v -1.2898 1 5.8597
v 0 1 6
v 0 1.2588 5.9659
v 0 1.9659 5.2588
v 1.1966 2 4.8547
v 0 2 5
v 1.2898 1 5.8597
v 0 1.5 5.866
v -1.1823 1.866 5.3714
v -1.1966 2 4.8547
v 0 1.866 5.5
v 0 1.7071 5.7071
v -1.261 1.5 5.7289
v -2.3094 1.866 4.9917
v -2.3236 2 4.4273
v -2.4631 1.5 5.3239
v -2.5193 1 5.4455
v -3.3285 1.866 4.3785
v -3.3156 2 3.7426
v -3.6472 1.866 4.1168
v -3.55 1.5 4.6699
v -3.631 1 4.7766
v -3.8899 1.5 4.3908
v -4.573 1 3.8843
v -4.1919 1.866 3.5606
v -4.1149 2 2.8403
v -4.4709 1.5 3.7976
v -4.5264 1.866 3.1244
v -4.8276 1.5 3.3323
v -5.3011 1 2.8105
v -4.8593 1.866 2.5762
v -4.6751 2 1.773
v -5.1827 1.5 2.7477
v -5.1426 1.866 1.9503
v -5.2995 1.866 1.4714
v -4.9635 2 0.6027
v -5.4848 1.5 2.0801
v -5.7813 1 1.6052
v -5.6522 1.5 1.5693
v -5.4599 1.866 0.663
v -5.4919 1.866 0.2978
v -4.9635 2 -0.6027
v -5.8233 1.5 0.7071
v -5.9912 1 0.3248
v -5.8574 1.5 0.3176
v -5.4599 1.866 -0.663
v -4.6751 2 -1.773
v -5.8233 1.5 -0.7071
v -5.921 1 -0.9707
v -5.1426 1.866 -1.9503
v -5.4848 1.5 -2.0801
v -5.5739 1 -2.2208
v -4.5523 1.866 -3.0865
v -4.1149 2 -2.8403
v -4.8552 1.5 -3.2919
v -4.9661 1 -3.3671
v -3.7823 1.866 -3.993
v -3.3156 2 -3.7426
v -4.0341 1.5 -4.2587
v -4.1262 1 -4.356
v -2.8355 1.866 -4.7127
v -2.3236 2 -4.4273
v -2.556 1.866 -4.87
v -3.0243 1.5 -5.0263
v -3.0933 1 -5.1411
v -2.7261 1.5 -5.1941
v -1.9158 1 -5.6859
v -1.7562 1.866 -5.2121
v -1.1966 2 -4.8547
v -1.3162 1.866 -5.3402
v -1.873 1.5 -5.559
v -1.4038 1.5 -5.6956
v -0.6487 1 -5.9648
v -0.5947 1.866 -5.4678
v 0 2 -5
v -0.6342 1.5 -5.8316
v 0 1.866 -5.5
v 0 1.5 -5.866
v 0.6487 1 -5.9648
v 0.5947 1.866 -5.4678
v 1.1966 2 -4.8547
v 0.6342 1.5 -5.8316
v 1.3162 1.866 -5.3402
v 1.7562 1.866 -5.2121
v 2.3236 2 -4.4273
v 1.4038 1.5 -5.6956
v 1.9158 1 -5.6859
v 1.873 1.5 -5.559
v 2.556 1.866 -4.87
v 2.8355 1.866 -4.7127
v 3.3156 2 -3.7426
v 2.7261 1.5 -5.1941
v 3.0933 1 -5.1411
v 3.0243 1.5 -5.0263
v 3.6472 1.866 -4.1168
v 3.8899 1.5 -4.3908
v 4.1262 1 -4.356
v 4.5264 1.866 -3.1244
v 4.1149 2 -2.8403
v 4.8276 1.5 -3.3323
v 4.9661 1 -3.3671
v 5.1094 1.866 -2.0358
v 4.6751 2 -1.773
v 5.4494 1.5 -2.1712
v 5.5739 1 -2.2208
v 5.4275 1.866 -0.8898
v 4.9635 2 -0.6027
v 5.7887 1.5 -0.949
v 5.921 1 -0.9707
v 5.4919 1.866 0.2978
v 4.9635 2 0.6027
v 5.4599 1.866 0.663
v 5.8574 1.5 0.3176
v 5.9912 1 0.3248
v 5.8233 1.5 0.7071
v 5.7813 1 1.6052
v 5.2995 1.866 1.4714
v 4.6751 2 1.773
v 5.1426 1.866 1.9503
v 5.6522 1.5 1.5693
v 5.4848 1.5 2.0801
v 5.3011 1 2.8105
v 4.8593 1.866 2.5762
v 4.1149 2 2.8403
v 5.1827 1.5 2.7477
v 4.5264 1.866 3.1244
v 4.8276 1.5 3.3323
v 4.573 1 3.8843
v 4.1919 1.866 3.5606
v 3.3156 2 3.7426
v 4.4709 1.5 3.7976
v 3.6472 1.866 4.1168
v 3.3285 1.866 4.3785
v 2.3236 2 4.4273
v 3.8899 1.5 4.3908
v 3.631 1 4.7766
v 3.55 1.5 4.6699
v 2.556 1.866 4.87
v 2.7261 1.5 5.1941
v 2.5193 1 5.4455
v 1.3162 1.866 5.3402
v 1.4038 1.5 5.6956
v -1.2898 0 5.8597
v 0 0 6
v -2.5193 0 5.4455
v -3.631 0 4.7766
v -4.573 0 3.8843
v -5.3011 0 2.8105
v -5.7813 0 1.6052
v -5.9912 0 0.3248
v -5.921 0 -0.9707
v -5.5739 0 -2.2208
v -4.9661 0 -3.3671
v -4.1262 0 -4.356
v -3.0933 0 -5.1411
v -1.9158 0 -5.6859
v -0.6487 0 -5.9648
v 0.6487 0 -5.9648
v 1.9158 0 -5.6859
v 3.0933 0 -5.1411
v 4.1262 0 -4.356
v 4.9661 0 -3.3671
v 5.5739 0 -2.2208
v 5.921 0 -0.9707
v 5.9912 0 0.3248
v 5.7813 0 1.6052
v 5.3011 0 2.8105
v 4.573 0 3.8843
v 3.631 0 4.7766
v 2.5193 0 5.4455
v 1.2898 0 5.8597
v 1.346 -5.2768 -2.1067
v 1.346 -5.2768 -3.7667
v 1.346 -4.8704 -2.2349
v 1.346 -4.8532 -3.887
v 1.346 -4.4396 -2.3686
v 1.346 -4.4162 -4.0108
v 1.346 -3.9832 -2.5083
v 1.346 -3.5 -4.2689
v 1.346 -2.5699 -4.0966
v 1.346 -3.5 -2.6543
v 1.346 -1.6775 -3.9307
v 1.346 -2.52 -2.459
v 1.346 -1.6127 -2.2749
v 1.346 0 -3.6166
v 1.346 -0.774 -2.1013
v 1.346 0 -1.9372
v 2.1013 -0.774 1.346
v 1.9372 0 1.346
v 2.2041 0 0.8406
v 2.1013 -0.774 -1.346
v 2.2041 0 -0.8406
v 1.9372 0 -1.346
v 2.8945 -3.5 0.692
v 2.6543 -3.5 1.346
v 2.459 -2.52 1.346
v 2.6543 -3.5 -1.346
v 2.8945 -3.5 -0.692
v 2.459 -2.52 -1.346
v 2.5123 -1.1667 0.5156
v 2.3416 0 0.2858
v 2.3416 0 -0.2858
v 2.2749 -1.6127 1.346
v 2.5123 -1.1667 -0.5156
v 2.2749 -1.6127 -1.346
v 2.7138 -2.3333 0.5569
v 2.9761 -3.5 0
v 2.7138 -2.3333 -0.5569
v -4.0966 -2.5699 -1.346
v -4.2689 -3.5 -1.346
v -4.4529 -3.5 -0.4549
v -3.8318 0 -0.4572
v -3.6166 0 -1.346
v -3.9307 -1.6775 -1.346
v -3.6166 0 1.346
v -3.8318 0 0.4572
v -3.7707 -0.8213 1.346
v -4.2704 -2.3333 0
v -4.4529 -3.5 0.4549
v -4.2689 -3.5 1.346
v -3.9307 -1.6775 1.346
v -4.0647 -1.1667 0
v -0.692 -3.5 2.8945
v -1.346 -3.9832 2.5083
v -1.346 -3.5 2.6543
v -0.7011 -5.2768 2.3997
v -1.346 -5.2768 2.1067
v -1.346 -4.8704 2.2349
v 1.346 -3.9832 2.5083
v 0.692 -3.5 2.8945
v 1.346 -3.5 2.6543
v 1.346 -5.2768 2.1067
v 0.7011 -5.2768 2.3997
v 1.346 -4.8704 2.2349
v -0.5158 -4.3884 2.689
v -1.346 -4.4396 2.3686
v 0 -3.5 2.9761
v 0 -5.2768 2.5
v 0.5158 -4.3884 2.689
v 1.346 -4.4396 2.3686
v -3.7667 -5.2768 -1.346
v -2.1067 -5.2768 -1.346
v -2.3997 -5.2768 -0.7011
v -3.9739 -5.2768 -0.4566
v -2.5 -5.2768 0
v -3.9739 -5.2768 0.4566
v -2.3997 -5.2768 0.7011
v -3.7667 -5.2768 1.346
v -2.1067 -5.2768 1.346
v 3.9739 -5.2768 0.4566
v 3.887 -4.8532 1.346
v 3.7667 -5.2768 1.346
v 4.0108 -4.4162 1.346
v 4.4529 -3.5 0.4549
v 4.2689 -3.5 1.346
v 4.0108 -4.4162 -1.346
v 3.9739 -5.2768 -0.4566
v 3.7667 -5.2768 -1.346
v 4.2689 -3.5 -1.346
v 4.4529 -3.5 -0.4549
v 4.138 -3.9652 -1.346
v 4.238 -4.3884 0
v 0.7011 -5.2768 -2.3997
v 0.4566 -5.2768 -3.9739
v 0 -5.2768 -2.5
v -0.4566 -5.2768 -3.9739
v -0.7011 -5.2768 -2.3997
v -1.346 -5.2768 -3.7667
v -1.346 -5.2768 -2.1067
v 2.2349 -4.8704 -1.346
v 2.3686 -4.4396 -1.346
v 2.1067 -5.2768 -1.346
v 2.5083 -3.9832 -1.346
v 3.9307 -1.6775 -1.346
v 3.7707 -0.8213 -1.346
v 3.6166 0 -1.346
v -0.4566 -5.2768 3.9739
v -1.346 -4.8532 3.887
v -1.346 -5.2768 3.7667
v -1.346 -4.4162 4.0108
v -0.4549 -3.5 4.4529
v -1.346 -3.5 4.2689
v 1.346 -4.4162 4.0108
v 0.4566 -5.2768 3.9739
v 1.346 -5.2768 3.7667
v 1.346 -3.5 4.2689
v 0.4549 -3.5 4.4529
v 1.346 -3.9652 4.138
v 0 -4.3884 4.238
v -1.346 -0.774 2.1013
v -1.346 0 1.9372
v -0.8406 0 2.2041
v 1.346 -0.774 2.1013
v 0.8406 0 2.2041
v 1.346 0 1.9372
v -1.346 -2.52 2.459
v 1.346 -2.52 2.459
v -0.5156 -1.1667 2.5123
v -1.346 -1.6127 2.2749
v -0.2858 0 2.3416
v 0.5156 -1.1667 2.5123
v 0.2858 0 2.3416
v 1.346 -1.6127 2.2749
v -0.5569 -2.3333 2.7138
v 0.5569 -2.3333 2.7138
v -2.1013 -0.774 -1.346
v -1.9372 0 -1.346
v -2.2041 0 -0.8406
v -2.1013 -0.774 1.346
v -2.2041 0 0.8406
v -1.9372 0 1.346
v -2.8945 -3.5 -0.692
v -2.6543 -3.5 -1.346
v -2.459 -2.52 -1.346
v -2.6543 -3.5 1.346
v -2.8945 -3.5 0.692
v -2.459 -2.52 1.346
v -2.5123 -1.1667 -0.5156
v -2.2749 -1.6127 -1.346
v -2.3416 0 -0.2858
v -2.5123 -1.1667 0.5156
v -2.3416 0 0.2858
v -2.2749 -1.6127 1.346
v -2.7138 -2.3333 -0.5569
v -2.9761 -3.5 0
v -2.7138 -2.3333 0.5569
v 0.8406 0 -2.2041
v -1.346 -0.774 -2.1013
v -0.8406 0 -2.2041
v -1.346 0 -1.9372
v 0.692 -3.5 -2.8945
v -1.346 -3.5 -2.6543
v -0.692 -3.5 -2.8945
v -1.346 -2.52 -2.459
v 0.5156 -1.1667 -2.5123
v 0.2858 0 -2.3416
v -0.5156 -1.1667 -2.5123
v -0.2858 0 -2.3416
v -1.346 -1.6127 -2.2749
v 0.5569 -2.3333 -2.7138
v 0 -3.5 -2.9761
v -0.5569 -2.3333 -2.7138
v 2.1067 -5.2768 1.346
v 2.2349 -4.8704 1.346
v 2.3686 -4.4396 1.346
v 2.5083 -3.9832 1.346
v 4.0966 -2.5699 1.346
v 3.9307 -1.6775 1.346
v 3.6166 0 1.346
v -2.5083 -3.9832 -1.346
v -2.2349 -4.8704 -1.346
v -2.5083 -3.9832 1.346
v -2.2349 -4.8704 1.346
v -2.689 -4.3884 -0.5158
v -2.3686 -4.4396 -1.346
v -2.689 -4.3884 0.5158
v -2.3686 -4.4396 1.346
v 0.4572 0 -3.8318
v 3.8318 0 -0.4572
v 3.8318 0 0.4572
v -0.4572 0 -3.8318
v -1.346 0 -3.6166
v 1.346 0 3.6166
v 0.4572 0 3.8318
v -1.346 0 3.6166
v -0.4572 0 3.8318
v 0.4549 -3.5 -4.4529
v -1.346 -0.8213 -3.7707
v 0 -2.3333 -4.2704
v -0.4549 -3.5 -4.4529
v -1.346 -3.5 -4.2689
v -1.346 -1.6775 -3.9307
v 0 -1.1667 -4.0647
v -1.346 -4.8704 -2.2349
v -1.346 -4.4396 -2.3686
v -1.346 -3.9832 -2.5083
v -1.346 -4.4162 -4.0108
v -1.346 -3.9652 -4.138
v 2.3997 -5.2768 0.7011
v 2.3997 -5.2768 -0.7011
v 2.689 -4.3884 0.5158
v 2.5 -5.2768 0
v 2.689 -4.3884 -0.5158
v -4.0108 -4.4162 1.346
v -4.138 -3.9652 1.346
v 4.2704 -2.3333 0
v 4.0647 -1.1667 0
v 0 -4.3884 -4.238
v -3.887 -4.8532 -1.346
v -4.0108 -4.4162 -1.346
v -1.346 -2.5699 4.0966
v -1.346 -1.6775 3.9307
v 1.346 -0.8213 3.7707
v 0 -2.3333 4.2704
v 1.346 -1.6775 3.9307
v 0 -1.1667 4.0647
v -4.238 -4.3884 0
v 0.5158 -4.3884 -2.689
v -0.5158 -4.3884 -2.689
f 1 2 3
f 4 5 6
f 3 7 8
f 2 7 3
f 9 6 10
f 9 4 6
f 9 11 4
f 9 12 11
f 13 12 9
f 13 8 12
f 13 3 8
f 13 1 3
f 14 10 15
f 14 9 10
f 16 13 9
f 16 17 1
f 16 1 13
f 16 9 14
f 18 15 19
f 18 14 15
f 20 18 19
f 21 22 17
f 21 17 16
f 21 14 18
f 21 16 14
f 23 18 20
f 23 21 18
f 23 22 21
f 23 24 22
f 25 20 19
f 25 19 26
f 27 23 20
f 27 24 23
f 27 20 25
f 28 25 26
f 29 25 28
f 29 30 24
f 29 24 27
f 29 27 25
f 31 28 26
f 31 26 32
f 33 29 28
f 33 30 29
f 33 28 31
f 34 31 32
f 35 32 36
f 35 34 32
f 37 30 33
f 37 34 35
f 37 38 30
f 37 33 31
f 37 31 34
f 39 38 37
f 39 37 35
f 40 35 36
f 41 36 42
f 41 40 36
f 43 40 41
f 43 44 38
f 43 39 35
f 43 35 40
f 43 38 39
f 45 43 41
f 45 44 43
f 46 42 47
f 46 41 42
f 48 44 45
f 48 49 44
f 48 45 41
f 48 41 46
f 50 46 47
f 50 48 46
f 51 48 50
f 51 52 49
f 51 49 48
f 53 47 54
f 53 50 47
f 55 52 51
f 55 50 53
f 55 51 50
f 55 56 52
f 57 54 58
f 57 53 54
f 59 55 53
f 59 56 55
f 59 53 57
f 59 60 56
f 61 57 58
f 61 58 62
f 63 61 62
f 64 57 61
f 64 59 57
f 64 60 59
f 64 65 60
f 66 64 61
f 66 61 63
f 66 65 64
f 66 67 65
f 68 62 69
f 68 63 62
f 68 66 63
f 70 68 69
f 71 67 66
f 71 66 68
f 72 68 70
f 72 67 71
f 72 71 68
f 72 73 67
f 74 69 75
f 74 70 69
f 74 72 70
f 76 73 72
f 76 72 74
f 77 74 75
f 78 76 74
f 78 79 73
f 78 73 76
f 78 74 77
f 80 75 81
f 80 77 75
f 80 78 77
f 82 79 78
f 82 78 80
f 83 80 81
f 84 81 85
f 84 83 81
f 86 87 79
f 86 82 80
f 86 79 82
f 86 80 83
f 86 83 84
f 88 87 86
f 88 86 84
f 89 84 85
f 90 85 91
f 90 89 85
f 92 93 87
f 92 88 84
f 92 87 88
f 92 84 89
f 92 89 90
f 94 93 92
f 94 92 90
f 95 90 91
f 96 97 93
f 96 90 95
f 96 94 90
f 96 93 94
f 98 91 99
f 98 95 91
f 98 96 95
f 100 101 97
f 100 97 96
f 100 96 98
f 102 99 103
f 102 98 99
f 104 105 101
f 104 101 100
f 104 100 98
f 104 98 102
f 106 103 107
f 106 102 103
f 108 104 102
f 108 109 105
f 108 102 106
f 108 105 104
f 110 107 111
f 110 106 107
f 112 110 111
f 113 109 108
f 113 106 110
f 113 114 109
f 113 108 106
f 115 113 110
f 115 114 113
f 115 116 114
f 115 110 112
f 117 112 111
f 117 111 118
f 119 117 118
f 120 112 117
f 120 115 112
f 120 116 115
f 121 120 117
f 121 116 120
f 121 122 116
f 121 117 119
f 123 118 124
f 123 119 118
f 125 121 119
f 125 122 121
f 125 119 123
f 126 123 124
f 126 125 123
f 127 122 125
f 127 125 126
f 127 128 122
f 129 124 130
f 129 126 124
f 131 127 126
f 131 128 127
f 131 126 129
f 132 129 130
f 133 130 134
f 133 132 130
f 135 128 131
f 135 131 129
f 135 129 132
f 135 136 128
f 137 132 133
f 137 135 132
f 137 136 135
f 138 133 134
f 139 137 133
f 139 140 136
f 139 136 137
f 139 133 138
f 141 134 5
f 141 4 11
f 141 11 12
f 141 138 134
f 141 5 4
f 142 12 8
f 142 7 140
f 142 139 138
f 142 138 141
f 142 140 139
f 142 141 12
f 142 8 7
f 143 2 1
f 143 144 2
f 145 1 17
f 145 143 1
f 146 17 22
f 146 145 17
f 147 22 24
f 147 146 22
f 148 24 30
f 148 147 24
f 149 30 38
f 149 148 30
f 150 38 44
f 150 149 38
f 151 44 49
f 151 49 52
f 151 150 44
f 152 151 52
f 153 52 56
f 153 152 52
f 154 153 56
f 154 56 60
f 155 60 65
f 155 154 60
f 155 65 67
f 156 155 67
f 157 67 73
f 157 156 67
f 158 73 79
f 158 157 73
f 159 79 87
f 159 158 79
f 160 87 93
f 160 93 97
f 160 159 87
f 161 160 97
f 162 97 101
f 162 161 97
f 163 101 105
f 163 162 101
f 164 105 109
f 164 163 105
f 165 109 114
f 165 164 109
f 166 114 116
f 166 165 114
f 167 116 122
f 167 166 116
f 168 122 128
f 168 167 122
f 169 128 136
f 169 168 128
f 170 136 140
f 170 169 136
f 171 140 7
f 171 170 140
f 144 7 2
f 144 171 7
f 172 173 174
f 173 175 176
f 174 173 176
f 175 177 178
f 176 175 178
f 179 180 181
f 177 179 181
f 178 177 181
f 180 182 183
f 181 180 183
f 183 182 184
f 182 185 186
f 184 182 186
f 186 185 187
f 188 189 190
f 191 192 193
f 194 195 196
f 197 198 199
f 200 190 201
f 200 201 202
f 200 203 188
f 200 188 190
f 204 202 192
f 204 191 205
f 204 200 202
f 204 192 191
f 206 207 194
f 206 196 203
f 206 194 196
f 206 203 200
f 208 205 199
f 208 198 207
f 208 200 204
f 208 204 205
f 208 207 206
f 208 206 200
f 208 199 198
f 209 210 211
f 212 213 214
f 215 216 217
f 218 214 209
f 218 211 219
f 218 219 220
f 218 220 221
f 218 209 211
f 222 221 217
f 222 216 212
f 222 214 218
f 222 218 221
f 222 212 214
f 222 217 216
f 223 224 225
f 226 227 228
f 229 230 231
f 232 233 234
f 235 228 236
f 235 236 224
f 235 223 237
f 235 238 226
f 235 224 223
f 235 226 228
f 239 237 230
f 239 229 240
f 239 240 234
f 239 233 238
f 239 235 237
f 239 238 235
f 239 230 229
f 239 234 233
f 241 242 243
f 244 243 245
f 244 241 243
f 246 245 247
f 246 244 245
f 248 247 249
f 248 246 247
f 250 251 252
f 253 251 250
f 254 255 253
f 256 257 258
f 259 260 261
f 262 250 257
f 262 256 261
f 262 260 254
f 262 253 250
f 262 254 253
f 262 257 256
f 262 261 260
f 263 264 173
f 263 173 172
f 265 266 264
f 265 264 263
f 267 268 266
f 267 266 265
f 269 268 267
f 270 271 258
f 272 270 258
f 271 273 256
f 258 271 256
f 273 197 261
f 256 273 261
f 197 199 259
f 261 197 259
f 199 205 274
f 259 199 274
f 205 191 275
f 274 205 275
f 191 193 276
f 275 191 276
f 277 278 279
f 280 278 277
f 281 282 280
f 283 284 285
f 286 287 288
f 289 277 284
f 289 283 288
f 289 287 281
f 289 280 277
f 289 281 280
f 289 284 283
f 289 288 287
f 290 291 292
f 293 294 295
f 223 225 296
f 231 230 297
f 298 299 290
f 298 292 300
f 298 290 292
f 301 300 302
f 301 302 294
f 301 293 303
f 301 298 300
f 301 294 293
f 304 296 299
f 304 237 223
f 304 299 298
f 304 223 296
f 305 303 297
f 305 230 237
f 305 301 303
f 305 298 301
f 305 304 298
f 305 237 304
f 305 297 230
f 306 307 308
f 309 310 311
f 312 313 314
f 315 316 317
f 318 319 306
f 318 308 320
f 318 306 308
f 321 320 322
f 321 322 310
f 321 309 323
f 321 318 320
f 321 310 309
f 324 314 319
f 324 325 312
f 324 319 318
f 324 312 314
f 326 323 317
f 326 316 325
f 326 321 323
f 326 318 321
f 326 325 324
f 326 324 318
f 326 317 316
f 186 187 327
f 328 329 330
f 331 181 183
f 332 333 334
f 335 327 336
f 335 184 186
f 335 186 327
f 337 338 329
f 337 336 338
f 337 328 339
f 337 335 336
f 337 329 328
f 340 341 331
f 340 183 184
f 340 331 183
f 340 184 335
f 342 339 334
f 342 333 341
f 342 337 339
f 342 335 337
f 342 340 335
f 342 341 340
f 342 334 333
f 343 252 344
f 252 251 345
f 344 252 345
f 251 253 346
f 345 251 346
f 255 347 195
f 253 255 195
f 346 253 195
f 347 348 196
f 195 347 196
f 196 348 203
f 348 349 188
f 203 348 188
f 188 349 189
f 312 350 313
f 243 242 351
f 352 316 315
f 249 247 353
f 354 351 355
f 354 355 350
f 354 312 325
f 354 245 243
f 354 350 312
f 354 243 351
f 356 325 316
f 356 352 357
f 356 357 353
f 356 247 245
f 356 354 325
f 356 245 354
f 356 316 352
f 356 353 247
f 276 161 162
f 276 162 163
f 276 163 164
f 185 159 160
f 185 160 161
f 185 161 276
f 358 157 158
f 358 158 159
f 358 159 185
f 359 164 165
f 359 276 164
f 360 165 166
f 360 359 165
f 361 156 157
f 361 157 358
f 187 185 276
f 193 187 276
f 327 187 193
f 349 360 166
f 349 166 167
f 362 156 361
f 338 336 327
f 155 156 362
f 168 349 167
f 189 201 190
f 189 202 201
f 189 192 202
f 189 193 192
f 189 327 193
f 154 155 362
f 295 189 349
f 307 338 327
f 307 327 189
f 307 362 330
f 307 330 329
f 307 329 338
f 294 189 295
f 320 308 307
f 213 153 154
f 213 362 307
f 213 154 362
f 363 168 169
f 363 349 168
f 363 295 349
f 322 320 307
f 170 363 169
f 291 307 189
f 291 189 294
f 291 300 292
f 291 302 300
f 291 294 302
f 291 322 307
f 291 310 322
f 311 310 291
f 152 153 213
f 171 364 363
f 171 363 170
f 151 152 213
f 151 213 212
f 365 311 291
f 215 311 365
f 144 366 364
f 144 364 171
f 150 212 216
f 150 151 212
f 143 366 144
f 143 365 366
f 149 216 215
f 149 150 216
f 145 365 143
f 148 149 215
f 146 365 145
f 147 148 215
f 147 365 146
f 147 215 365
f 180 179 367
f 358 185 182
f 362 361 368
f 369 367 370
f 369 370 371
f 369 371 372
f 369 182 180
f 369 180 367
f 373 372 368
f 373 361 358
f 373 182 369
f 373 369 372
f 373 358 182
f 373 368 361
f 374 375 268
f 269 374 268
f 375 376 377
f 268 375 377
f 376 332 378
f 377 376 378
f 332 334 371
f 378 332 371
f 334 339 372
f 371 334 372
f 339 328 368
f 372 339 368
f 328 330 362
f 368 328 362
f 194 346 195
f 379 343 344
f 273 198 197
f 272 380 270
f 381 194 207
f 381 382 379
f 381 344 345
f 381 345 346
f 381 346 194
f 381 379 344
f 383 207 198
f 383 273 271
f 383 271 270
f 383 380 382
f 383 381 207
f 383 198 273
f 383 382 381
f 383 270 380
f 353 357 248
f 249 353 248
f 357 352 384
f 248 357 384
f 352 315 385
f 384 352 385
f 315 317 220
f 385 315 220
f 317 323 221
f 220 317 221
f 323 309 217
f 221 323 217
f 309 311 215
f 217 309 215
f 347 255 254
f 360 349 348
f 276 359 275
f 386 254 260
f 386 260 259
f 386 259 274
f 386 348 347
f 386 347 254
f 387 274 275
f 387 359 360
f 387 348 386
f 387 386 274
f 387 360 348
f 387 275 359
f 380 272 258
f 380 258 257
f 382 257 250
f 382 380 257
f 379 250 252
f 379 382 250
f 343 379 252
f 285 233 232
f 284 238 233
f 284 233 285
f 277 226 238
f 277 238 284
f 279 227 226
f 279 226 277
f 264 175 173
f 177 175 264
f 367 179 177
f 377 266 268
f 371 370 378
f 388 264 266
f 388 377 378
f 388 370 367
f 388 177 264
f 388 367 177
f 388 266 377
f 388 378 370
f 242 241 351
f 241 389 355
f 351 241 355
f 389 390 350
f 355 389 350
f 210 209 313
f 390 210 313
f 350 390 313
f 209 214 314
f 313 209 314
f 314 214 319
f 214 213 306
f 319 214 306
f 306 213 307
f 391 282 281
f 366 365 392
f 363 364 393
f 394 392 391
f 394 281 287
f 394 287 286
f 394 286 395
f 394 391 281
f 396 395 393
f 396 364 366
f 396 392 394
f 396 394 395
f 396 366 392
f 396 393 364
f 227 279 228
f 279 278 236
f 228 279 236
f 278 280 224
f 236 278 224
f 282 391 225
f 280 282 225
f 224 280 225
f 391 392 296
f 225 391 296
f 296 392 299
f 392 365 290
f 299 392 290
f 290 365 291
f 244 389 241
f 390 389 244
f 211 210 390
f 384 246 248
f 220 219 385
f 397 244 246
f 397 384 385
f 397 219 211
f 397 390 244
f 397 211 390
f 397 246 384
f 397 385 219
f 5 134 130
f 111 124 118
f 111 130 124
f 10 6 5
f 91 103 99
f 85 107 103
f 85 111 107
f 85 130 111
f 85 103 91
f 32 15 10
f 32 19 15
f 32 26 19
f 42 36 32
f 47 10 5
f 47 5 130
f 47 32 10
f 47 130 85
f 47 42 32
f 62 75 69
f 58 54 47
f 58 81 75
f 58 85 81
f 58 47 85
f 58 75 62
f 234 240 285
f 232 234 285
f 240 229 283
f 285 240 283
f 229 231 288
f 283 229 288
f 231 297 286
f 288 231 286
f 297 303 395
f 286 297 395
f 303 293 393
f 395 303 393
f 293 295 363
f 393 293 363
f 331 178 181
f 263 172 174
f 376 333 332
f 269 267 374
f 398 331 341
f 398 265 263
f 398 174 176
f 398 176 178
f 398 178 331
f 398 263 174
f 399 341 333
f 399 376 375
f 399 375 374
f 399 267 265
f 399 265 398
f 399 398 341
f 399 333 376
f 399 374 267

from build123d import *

# Parameters (mm, degrees)
CUT_EXTRUDE1_DEPTH = 10.992209668


with BuildPart() as part:
    # Sketch1 → Revolve1 (revolve)
    with BuildSketch(Plane.XY, mode=Mode.PRIVATE) as revolve1_sk:
        with BuildLine():
            Line((0, 2), (-5, 2))
            ThreePointArc((-5, 2), (-5.707106781, 1.707106781), (-6, 1))
            Line((-6, 1), (-6, 0))
            Line((-6, 0), (0, 0))
            Line((0, 0), (0, 2))
        make_face()
    revolve(revolve1_sk.sketch.rotate(Axis((0, 2, 0), (0, -1, 0)), 270), axis=Axis((0, 2, 0), (0, -1, 0)))

    # Sketch2 → Revolve2 (revolve)
    with BuildSketch(Plane.XY, mode=Mode.PRIVATE) as revolve2_sk:
        Polygon((-4.476082848, -3.5), (-3.858938415, 0), (-2.358938415, 0), (-2.976082848, -3.5), (-2.5, -5.276765377), (-4, -5.276765377), align=None)
    revolve(revolve2_sk.sketch.rotate(Axis((0, -3.5, 0), (0, 1, 0)), 270), axis=Axis((0, -3.5, 0), (0, 1, 0)))

    # Sketch3 → Cut-Extrude1 (cut, through all)
    with BuildSketch(Plane(origin=(0, 0, 0), x_dir=(1, 0, 0), z_dir=(0, 1, 0))):
        with BuildLine():
            Line((-4.268916085, 1.345984071), (-1.345984071, 1.345984071))
            Line((-1.345984071, 1.345984071), (-1.345984071, 4.268916085))
            ThreePointArc((-1.345984071, 4.268916085), (-3.165068535, 3.165068535), (-4.268916085, 1.345984071))
        make_face()
        with BuildLine():
            Line((1.345984071, 1.345984071), (4.268916085, 1.345984071))
            ThreePointArc((4.268916085, 1.345984071), (3.165068535, 3.165068535), (1.345984071, 4.268916085))
            Line((1.345984071, 4.268916085), (1.345984071, 1.345984071))
        make_face()
        with BuildLine():
            Line((-1.345984071, -1.345984071), (-4.268916085, -1.345984071))
            ThreePointArc((-4.268916085, -1.345984071), (-3.165068535, -3.165068535), (-1.345984071, -4.268916085))
            Line((-1.345984071, -4.268916085), (-1.345984071, -1.345984071))
        make_face()
        with BuildLine():
            Line((1.345984071, -1.345984071), (1.345984071, -4.268916085))
            ThreePointArc((1.345984071, -4.268916085), (3.165068535, -3.165068535), (4.268916085, -1.345984071))
            Line((4.268916085, -1.345984071), (1.345984071, -1.345984071))
        make_face()
    extrude(amount=-CUT_EXTRUDE1_DEPTH, mode=Mode.SUBTRACT)


solid = part.part
